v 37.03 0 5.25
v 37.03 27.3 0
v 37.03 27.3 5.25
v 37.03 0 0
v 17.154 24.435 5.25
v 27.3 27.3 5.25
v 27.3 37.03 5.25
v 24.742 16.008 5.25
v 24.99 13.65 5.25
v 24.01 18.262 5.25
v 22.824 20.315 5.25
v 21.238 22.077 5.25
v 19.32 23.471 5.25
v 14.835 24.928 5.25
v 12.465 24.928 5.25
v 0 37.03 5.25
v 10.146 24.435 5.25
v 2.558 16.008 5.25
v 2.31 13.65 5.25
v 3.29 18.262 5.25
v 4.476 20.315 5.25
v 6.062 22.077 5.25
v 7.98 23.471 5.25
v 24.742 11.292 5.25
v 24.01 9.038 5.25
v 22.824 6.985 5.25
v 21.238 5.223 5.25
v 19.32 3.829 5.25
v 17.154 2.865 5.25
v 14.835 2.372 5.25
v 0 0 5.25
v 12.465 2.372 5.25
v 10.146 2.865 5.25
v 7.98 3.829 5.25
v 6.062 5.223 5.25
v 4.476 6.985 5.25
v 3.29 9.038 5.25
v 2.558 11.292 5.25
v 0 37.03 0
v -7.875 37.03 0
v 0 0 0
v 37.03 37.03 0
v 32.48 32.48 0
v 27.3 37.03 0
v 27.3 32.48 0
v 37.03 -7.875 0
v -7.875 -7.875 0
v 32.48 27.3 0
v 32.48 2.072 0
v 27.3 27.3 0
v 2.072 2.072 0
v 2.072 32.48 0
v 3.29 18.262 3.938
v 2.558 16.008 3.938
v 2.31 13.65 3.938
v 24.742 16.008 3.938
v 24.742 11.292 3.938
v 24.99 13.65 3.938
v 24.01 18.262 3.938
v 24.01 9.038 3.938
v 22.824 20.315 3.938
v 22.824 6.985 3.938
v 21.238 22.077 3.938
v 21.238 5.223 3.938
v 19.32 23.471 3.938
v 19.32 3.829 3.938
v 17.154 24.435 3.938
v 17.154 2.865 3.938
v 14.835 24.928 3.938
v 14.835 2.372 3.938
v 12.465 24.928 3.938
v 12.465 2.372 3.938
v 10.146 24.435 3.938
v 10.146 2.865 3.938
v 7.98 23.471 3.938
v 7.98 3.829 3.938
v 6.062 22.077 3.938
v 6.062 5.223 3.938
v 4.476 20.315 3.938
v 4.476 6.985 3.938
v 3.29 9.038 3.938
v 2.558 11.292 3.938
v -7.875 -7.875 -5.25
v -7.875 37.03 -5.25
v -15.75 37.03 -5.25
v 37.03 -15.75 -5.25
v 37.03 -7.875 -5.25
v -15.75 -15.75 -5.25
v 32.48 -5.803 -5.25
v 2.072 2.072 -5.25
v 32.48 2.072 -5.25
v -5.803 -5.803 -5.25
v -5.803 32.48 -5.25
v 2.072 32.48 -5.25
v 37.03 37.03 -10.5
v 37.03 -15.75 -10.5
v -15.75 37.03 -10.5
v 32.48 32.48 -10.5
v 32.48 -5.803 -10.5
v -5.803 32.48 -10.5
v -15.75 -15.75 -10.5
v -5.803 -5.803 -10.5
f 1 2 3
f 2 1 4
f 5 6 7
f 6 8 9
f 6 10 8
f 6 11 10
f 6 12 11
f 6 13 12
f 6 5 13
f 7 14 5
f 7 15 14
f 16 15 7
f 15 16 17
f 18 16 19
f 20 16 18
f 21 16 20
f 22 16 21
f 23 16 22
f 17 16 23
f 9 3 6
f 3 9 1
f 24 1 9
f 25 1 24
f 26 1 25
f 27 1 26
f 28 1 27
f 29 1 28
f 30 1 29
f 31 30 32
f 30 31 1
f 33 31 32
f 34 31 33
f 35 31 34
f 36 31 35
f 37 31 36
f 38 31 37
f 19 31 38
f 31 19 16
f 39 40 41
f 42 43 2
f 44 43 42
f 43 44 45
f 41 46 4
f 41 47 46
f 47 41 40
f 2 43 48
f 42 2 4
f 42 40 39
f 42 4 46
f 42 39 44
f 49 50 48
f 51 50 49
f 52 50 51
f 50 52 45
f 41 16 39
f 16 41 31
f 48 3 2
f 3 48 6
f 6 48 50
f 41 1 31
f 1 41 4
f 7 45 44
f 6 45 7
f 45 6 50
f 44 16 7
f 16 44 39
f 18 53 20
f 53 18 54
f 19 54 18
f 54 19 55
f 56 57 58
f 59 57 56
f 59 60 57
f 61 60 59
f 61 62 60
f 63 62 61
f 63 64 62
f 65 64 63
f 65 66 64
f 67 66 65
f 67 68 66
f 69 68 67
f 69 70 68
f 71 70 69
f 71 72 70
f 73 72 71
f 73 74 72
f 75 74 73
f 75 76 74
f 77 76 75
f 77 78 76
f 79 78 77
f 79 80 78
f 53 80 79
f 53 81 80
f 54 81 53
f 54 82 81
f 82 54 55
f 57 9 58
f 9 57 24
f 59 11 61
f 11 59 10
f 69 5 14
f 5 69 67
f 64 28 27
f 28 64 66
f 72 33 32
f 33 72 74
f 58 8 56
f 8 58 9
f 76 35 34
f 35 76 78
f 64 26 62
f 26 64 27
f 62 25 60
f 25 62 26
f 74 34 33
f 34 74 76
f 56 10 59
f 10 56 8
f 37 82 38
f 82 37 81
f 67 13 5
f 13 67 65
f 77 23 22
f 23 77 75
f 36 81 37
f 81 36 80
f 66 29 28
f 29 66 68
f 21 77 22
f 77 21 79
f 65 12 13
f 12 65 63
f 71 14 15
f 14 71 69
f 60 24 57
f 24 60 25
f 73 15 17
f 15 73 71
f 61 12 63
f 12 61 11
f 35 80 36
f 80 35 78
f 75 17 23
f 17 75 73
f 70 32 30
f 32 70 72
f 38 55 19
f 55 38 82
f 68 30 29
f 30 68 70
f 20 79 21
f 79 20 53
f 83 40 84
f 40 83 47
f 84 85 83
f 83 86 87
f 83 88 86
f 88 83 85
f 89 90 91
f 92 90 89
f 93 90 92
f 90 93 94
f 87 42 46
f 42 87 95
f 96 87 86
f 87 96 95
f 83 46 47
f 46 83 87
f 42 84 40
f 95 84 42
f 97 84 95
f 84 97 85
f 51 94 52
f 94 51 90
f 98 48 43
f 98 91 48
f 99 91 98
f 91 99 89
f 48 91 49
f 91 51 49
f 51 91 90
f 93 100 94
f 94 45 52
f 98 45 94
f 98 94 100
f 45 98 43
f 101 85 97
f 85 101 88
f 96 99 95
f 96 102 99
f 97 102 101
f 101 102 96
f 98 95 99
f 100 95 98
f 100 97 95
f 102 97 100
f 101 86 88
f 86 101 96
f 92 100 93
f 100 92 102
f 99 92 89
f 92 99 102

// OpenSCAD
coldiameter = 17.5;
mod = coldiameter;
colheight = 82;
cbdiameter = 21;				//diameter of column base (for inset)
b_length = colheight/1.618;
b_width = cbdiameter *1.3;
b_height = cbdiameter/4;
step_width = b_height * 1.5;

//straight_base();
//translate([0,b_width+15,0]) straight_base();
//steps(2);
//corner_base();
//corner_steps(2);
//step_unit(2);
corner_unit(2);

module corner_unit(flights) {
	corner_base();
	rotate([0,0,180]) translate([-b_length+b_width/2,-b_length+b_width/2,0]) 
		corner_steps(flights);
}

module step_unit(flights) {
	rotate([0,0,180]) translate([-b_length*2+b_width/2,-b_width,0]) 
	 	union() { straight_base(); steps(flights);}
}

module large_corner_unit(flights) {
	rotate([0,0,180]) translate([-b_length*2+b_width/2,-b_width,0]) 
	 	union() { straight_base(); steps(flights);}
	translate([b_width,b_length-b_width/2,0]) rotate([0,0,90]) 
		union() { straight_base(); steps(flights);}
	corner_base();
	rotate([0,0,180]) translate([-b_length+b_width/2,-b_length+b_width/2,0]) 
		corner_steps(flights);
}

module corner_steps(flights) {
for ( i = [1 : flights] ) {
	translate([0,0,-b_height*i])
	difference() {
		cube([b_length-b_width/2+(step_width*i),b_length-b_width/2+(step_width*i),b_height]);
		translate([b_width/6,b_width/6,0])
		cube([b_length-b_length/2.5+(step_width*(i-1)),b_length-b_length/2.5+(step_width*(i-1)),b_height+b_height/10]);
	}
	}
}

module steps(flights) {
for ( i = [1 : flights] ) {
	translate([0,0,-b_height*i])
	difference() {
		cube([b_length,(step_width*i)+b_width,b_height]);
		translate([b_length/10,b_width/10,0])
		cube([b_length-b_length/5,b_width-b_width/10+(step_width*(i-1)),b_height+b_height/10]);
	}
//	difference () {
		translate([0,-b_width/3,-b_height*i])  cube([b_length,b_width/3,b_height]);

//	}
	}
}

module corner_base() {
difference() {
	union() {
	cube([b_length-b_width/2,b_width,b_height]);
	cube([b_width, b_length-b_width/2, b_height]);
	}
	translate([b_width/2,b_width/2,b_height*.75])
		cylinder(h=b_height*.5,r=cbdiameter*.54);
	}
}

module straight_base() {
difference() {
	cube([b_length,b_width,b_height]);
	translate([b_length/2,b_width/2,b_height*.75])
		cylinder(h=b_height*.5,r=cbdiameter*.54);   //fudge factor
	translate([b_length/20,b_width/5,0])
		cube([b_length/2-(b_length/10),b_width-(2*b_width/5),b_height/2]);
	translate([b_length/20+b_length/2,b_width/5,0])
		cube([b_length/2-(b_length/10),b_width-(2*b_width/5),b_height/2]);}
}
